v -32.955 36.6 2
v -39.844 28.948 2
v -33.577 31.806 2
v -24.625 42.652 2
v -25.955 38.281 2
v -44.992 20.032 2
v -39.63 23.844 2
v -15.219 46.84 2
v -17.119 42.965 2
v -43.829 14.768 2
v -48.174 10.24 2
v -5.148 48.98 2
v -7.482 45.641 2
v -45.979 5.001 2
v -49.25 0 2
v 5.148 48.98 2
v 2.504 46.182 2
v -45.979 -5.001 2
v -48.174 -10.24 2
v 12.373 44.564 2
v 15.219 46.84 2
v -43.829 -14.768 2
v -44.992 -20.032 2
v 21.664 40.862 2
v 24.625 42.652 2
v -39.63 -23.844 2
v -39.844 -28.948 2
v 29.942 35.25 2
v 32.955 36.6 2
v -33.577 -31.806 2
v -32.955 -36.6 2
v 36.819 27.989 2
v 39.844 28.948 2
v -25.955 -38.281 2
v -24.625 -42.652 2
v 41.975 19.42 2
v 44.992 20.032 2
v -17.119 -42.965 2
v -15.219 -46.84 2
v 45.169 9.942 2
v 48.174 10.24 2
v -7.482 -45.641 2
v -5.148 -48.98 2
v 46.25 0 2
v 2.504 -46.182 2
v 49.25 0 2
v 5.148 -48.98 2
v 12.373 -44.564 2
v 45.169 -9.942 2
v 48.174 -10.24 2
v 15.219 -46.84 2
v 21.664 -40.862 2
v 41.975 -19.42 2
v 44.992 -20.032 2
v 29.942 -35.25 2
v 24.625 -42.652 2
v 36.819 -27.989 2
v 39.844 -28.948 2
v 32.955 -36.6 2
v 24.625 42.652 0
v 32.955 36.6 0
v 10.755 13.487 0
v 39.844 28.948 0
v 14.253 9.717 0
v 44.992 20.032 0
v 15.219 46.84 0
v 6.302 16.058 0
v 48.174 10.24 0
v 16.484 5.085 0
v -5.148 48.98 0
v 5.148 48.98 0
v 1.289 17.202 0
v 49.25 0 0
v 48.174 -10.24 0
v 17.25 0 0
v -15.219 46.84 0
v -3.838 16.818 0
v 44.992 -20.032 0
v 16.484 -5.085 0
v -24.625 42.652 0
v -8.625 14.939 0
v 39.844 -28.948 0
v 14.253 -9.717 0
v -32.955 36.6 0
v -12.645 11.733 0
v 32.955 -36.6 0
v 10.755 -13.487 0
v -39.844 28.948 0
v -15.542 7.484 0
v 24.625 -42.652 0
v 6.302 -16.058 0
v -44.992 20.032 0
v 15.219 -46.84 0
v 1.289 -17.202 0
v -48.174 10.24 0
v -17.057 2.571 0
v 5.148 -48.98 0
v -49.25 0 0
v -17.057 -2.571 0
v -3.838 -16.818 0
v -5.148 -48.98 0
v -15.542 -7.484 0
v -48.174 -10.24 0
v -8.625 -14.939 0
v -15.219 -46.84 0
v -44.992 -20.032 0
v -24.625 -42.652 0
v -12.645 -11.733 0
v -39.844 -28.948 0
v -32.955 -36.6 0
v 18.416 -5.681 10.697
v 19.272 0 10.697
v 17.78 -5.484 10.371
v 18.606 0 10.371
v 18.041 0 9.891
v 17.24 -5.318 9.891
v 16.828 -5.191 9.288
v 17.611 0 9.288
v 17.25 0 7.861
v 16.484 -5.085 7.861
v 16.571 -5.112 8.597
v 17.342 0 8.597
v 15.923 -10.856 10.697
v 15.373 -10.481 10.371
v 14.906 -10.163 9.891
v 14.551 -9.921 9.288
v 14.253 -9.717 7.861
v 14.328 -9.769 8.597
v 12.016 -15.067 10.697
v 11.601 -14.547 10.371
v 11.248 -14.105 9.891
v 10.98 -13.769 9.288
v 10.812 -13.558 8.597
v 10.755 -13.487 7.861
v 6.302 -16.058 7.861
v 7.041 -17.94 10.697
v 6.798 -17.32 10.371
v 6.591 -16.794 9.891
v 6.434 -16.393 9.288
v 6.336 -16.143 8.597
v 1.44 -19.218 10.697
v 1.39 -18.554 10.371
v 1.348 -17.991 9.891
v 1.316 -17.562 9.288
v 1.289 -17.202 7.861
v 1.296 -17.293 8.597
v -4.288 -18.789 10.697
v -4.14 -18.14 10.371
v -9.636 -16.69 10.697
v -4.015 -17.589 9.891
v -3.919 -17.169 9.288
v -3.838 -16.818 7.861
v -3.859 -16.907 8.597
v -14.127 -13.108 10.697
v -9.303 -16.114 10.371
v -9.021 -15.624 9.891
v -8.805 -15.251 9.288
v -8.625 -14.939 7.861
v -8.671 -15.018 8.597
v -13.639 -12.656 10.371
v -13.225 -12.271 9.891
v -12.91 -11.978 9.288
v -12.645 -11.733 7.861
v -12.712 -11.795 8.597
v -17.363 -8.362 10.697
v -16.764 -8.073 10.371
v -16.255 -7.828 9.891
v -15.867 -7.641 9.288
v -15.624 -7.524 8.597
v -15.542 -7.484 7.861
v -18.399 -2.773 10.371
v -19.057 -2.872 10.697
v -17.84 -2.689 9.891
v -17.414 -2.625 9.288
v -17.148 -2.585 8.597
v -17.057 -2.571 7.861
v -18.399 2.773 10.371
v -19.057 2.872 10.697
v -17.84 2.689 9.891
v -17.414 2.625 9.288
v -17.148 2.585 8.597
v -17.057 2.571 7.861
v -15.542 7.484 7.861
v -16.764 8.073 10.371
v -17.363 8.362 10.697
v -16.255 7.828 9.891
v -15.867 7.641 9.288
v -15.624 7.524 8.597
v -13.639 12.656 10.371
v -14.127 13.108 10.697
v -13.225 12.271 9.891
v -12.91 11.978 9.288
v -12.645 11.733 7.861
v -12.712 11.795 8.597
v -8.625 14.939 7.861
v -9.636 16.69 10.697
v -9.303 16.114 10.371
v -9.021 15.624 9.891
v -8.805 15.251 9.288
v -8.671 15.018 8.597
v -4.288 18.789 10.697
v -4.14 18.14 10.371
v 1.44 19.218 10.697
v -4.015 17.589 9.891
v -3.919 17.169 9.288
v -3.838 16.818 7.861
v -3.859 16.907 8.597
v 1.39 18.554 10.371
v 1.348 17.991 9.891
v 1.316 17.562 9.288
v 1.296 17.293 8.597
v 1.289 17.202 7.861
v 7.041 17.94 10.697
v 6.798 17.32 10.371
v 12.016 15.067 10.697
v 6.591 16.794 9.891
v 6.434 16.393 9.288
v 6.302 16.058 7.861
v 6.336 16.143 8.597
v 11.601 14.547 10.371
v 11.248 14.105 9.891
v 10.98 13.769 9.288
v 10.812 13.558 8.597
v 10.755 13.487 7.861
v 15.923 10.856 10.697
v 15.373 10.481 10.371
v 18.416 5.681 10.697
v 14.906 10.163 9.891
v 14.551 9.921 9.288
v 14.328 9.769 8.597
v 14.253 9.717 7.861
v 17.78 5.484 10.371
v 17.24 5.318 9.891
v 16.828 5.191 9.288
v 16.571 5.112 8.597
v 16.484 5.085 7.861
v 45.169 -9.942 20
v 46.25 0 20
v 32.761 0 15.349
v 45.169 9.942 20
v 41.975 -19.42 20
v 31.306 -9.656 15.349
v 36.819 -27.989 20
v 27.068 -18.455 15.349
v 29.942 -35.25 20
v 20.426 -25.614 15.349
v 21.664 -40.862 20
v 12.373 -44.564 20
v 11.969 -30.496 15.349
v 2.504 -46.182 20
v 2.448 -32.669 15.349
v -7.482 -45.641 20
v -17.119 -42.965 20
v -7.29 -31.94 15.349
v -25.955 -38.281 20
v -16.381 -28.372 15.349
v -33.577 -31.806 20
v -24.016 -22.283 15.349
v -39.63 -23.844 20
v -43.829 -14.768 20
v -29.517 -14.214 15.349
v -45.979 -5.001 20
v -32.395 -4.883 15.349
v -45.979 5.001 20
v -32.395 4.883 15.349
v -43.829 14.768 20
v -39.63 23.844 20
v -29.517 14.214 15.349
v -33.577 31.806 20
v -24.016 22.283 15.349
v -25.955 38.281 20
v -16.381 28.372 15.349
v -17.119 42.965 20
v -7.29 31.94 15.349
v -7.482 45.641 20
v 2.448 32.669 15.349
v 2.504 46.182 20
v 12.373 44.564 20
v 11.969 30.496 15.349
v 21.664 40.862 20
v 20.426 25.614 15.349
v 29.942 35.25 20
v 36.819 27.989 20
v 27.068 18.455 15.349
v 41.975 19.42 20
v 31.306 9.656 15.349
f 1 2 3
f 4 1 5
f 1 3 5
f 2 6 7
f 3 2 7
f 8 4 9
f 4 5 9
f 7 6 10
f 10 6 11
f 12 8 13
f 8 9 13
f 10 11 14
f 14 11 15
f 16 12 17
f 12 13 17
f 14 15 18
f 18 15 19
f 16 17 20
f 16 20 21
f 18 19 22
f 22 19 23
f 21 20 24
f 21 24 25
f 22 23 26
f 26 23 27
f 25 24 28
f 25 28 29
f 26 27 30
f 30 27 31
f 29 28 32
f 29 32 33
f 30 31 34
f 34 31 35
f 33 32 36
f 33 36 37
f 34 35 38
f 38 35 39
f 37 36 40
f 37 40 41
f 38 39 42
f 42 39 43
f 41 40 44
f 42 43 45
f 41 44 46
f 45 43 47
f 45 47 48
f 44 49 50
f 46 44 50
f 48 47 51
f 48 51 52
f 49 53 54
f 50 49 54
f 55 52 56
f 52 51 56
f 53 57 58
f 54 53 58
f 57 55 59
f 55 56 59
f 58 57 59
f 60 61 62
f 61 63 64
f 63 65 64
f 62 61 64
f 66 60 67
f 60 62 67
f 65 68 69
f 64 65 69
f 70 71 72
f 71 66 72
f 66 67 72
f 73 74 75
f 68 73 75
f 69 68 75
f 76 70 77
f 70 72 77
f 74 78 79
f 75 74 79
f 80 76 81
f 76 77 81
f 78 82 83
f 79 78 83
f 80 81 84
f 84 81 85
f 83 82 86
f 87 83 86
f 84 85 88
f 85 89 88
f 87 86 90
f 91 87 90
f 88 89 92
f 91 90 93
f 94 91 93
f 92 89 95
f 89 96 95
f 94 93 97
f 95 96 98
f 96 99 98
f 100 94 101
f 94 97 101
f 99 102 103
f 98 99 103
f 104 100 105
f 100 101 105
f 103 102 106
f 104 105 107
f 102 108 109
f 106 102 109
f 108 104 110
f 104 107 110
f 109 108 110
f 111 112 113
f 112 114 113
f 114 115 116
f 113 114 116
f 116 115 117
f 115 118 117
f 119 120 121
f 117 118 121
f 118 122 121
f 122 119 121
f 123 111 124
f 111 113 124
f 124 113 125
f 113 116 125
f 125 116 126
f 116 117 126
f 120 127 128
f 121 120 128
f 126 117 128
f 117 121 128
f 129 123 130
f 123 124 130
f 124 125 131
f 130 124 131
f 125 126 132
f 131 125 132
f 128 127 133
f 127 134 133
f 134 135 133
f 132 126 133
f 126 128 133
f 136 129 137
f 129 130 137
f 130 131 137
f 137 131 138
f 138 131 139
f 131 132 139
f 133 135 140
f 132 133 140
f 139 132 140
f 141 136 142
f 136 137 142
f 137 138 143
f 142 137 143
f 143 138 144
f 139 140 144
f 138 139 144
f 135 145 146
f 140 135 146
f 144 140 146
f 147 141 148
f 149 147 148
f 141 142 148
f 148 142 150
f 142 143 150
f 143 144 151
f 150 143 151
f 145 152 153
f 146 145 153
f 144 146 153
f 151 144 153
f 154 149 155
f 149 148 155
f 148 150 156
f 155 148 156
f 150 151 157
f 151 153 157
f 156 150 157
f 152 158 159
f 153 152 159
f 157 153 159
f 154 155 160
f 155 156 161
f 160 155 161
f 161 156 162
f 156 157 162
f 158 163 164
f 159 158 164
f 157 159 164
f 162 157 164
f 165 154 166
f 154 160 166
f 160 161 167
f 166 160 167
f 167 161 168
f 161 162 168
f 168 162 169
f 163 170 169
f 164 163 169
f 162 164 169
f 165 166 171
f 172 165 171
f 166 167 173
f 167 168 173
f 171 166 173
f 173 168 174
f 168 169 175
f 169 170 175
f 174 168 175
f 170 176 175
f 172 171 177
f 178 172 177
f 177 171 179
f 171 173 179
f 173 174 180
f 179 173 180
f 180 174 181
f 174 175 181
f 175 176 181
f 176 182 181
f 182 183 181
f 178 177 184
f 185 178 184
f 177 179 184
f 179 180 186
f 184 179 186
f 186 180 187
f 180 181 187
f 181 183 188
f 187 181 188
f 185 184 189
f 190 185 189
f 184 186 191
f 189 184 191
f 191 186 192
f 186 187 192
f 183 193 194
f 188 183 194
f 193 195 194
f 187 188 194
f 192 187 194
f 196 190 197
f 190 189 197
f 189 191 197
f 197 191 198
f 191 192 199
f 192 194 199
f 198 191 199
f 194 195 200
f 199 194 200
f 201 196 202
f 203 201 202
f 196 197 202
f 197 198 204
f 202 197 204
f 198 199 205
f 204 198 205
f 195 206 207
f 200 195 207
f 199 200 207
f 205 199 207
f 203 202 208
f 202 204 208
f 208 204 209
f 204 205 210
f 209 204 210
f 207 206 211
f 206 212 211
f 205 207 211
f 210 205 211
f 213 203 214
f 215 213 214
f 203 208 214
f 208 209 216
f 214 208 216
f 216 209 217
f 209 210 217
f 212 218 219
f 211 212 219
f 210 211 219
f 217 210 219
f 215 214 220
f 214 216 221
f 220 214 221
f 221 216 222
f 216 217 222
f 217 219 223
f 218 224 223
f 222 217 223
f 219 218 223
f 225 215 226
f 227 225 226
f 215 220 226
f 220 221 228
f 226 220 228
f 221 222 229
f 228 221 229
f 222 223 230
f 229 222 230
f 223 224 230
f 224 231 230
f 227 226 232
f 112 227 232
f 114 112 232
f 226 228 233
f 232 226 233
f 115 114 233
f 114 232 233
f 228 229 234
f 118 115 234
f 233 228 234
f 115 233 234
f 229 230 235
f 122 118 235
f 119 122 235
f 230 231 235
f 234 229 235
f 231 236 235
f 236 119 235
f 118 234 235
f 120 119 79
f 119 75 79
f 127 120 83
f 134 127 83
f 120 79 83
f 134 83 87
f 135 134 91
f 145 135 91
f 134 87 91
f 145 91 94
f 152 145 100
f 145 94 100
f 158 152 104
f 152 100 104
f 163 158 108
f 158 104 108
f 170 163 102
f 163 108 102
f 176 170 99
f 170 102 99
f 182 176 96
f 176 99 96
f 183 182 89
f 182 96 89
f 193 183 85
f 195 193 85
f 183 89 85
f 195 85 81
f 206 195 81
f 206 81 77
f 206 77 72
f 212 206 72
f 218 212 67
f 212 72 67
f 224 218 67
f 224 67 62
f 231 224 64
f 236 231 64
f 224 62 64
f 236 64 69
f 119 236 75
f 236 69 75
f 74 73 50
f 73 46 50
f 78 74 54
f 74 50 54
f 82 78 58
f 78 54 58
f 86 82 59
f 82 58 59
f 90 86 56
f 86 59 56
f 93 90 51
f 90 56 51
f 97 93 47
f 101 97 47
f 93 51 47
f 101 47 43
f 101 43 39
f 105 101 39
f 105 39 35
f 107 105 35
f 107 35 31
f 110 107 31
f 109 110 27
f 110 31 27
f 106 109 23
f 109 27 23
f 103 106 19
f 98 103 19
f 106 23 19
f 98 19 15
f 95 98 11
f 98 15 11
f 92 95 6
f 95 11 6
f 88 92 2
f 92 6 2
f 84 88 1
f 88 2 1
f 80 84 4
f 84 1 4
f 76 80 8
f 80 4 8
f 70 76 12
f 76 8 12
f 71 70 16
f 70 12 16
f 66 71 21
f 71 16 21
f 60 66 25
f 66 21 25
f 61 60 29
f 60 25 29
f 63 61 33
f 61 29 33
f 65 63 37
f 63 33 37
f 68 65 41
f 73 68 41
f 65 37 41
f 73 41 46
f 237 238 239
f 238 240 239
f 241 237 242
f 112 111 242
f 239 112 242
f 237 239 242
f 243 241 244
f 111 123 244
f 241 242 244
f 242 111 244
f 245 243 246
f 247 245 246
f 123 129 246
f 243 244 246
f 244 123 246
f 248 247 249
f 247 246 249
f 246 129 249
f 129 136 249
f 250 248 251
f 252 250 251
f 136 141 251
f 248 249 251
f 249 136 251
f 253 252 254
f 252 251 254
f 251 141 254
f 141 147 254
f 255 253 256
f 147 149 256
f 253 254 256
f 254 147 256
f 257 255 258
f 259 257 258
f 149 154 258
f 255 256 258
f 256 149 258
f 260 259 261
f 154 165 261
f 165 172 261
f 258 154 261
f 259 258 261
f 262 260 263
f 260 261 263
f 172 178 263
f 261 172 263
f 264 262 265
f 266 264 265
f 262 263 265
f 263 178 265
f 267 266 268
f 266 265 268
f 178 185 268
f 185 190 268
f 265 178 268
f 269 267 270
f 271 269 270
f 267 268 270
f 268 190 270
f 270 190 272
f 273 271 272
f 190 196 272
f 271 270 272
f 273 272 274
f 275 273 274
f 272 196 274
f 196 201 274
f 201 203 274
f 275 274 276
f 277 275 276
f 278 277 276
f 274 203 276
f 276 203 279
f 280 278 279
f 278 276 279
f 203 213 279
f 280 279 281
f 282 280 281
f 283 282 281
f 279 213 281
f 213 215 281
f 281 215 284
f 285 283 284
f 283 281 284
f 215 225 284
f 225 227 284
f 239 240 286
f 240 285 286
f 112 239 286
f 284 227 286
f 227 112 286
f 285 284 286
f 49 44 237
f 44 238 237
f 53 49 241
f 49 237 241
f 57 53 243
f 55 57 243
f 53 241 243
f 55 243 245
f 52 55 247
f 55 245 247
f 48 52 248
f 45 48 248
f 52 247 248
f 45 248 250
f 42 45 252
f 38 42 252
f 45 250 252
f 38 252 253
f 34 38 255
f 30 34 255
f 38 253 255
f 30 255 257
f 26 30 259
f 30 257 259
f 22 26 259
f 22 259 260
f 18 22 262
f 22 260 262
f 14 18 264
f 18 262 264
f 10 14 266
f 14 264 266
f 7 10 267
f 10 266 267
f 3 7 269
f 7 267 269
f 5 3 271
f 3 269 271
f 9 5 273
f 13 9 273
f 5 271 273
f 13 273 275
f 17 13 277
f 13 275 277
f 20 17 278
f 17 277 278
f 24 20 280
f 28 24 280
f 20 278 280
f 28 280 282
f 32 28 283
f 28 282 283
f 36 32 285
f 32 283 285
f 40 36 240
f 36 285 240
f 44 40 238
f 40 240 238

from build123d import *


with BuildPart() as f1:
    # F0 (on Front) → F1 (revolve)
    with BuildSketch(Plane.XZ):
        with BuildLine():
            Line((17.25, 7.861132), (17.25, 0))
            Line((17.25, 0), (46.25, 0))
            Line((46.25, 0), (49.25, 0))
            Line((49.25, 0), (49.25, 2))
            Line((49.25, 2), (46.25, 2))
            Line((46.25, 2), (46.25, 20))
            Line((46.25, 20), (19.272028, 10.697251))
            ThreePointArc((19.272028, 10.697251), (17.807264, 9.602695), (17.25, 7.861132))
        make_face()
    revolve(axis=Axis((0, 0, 5.085478), (0, 0, -1)))


solid = f1.part
